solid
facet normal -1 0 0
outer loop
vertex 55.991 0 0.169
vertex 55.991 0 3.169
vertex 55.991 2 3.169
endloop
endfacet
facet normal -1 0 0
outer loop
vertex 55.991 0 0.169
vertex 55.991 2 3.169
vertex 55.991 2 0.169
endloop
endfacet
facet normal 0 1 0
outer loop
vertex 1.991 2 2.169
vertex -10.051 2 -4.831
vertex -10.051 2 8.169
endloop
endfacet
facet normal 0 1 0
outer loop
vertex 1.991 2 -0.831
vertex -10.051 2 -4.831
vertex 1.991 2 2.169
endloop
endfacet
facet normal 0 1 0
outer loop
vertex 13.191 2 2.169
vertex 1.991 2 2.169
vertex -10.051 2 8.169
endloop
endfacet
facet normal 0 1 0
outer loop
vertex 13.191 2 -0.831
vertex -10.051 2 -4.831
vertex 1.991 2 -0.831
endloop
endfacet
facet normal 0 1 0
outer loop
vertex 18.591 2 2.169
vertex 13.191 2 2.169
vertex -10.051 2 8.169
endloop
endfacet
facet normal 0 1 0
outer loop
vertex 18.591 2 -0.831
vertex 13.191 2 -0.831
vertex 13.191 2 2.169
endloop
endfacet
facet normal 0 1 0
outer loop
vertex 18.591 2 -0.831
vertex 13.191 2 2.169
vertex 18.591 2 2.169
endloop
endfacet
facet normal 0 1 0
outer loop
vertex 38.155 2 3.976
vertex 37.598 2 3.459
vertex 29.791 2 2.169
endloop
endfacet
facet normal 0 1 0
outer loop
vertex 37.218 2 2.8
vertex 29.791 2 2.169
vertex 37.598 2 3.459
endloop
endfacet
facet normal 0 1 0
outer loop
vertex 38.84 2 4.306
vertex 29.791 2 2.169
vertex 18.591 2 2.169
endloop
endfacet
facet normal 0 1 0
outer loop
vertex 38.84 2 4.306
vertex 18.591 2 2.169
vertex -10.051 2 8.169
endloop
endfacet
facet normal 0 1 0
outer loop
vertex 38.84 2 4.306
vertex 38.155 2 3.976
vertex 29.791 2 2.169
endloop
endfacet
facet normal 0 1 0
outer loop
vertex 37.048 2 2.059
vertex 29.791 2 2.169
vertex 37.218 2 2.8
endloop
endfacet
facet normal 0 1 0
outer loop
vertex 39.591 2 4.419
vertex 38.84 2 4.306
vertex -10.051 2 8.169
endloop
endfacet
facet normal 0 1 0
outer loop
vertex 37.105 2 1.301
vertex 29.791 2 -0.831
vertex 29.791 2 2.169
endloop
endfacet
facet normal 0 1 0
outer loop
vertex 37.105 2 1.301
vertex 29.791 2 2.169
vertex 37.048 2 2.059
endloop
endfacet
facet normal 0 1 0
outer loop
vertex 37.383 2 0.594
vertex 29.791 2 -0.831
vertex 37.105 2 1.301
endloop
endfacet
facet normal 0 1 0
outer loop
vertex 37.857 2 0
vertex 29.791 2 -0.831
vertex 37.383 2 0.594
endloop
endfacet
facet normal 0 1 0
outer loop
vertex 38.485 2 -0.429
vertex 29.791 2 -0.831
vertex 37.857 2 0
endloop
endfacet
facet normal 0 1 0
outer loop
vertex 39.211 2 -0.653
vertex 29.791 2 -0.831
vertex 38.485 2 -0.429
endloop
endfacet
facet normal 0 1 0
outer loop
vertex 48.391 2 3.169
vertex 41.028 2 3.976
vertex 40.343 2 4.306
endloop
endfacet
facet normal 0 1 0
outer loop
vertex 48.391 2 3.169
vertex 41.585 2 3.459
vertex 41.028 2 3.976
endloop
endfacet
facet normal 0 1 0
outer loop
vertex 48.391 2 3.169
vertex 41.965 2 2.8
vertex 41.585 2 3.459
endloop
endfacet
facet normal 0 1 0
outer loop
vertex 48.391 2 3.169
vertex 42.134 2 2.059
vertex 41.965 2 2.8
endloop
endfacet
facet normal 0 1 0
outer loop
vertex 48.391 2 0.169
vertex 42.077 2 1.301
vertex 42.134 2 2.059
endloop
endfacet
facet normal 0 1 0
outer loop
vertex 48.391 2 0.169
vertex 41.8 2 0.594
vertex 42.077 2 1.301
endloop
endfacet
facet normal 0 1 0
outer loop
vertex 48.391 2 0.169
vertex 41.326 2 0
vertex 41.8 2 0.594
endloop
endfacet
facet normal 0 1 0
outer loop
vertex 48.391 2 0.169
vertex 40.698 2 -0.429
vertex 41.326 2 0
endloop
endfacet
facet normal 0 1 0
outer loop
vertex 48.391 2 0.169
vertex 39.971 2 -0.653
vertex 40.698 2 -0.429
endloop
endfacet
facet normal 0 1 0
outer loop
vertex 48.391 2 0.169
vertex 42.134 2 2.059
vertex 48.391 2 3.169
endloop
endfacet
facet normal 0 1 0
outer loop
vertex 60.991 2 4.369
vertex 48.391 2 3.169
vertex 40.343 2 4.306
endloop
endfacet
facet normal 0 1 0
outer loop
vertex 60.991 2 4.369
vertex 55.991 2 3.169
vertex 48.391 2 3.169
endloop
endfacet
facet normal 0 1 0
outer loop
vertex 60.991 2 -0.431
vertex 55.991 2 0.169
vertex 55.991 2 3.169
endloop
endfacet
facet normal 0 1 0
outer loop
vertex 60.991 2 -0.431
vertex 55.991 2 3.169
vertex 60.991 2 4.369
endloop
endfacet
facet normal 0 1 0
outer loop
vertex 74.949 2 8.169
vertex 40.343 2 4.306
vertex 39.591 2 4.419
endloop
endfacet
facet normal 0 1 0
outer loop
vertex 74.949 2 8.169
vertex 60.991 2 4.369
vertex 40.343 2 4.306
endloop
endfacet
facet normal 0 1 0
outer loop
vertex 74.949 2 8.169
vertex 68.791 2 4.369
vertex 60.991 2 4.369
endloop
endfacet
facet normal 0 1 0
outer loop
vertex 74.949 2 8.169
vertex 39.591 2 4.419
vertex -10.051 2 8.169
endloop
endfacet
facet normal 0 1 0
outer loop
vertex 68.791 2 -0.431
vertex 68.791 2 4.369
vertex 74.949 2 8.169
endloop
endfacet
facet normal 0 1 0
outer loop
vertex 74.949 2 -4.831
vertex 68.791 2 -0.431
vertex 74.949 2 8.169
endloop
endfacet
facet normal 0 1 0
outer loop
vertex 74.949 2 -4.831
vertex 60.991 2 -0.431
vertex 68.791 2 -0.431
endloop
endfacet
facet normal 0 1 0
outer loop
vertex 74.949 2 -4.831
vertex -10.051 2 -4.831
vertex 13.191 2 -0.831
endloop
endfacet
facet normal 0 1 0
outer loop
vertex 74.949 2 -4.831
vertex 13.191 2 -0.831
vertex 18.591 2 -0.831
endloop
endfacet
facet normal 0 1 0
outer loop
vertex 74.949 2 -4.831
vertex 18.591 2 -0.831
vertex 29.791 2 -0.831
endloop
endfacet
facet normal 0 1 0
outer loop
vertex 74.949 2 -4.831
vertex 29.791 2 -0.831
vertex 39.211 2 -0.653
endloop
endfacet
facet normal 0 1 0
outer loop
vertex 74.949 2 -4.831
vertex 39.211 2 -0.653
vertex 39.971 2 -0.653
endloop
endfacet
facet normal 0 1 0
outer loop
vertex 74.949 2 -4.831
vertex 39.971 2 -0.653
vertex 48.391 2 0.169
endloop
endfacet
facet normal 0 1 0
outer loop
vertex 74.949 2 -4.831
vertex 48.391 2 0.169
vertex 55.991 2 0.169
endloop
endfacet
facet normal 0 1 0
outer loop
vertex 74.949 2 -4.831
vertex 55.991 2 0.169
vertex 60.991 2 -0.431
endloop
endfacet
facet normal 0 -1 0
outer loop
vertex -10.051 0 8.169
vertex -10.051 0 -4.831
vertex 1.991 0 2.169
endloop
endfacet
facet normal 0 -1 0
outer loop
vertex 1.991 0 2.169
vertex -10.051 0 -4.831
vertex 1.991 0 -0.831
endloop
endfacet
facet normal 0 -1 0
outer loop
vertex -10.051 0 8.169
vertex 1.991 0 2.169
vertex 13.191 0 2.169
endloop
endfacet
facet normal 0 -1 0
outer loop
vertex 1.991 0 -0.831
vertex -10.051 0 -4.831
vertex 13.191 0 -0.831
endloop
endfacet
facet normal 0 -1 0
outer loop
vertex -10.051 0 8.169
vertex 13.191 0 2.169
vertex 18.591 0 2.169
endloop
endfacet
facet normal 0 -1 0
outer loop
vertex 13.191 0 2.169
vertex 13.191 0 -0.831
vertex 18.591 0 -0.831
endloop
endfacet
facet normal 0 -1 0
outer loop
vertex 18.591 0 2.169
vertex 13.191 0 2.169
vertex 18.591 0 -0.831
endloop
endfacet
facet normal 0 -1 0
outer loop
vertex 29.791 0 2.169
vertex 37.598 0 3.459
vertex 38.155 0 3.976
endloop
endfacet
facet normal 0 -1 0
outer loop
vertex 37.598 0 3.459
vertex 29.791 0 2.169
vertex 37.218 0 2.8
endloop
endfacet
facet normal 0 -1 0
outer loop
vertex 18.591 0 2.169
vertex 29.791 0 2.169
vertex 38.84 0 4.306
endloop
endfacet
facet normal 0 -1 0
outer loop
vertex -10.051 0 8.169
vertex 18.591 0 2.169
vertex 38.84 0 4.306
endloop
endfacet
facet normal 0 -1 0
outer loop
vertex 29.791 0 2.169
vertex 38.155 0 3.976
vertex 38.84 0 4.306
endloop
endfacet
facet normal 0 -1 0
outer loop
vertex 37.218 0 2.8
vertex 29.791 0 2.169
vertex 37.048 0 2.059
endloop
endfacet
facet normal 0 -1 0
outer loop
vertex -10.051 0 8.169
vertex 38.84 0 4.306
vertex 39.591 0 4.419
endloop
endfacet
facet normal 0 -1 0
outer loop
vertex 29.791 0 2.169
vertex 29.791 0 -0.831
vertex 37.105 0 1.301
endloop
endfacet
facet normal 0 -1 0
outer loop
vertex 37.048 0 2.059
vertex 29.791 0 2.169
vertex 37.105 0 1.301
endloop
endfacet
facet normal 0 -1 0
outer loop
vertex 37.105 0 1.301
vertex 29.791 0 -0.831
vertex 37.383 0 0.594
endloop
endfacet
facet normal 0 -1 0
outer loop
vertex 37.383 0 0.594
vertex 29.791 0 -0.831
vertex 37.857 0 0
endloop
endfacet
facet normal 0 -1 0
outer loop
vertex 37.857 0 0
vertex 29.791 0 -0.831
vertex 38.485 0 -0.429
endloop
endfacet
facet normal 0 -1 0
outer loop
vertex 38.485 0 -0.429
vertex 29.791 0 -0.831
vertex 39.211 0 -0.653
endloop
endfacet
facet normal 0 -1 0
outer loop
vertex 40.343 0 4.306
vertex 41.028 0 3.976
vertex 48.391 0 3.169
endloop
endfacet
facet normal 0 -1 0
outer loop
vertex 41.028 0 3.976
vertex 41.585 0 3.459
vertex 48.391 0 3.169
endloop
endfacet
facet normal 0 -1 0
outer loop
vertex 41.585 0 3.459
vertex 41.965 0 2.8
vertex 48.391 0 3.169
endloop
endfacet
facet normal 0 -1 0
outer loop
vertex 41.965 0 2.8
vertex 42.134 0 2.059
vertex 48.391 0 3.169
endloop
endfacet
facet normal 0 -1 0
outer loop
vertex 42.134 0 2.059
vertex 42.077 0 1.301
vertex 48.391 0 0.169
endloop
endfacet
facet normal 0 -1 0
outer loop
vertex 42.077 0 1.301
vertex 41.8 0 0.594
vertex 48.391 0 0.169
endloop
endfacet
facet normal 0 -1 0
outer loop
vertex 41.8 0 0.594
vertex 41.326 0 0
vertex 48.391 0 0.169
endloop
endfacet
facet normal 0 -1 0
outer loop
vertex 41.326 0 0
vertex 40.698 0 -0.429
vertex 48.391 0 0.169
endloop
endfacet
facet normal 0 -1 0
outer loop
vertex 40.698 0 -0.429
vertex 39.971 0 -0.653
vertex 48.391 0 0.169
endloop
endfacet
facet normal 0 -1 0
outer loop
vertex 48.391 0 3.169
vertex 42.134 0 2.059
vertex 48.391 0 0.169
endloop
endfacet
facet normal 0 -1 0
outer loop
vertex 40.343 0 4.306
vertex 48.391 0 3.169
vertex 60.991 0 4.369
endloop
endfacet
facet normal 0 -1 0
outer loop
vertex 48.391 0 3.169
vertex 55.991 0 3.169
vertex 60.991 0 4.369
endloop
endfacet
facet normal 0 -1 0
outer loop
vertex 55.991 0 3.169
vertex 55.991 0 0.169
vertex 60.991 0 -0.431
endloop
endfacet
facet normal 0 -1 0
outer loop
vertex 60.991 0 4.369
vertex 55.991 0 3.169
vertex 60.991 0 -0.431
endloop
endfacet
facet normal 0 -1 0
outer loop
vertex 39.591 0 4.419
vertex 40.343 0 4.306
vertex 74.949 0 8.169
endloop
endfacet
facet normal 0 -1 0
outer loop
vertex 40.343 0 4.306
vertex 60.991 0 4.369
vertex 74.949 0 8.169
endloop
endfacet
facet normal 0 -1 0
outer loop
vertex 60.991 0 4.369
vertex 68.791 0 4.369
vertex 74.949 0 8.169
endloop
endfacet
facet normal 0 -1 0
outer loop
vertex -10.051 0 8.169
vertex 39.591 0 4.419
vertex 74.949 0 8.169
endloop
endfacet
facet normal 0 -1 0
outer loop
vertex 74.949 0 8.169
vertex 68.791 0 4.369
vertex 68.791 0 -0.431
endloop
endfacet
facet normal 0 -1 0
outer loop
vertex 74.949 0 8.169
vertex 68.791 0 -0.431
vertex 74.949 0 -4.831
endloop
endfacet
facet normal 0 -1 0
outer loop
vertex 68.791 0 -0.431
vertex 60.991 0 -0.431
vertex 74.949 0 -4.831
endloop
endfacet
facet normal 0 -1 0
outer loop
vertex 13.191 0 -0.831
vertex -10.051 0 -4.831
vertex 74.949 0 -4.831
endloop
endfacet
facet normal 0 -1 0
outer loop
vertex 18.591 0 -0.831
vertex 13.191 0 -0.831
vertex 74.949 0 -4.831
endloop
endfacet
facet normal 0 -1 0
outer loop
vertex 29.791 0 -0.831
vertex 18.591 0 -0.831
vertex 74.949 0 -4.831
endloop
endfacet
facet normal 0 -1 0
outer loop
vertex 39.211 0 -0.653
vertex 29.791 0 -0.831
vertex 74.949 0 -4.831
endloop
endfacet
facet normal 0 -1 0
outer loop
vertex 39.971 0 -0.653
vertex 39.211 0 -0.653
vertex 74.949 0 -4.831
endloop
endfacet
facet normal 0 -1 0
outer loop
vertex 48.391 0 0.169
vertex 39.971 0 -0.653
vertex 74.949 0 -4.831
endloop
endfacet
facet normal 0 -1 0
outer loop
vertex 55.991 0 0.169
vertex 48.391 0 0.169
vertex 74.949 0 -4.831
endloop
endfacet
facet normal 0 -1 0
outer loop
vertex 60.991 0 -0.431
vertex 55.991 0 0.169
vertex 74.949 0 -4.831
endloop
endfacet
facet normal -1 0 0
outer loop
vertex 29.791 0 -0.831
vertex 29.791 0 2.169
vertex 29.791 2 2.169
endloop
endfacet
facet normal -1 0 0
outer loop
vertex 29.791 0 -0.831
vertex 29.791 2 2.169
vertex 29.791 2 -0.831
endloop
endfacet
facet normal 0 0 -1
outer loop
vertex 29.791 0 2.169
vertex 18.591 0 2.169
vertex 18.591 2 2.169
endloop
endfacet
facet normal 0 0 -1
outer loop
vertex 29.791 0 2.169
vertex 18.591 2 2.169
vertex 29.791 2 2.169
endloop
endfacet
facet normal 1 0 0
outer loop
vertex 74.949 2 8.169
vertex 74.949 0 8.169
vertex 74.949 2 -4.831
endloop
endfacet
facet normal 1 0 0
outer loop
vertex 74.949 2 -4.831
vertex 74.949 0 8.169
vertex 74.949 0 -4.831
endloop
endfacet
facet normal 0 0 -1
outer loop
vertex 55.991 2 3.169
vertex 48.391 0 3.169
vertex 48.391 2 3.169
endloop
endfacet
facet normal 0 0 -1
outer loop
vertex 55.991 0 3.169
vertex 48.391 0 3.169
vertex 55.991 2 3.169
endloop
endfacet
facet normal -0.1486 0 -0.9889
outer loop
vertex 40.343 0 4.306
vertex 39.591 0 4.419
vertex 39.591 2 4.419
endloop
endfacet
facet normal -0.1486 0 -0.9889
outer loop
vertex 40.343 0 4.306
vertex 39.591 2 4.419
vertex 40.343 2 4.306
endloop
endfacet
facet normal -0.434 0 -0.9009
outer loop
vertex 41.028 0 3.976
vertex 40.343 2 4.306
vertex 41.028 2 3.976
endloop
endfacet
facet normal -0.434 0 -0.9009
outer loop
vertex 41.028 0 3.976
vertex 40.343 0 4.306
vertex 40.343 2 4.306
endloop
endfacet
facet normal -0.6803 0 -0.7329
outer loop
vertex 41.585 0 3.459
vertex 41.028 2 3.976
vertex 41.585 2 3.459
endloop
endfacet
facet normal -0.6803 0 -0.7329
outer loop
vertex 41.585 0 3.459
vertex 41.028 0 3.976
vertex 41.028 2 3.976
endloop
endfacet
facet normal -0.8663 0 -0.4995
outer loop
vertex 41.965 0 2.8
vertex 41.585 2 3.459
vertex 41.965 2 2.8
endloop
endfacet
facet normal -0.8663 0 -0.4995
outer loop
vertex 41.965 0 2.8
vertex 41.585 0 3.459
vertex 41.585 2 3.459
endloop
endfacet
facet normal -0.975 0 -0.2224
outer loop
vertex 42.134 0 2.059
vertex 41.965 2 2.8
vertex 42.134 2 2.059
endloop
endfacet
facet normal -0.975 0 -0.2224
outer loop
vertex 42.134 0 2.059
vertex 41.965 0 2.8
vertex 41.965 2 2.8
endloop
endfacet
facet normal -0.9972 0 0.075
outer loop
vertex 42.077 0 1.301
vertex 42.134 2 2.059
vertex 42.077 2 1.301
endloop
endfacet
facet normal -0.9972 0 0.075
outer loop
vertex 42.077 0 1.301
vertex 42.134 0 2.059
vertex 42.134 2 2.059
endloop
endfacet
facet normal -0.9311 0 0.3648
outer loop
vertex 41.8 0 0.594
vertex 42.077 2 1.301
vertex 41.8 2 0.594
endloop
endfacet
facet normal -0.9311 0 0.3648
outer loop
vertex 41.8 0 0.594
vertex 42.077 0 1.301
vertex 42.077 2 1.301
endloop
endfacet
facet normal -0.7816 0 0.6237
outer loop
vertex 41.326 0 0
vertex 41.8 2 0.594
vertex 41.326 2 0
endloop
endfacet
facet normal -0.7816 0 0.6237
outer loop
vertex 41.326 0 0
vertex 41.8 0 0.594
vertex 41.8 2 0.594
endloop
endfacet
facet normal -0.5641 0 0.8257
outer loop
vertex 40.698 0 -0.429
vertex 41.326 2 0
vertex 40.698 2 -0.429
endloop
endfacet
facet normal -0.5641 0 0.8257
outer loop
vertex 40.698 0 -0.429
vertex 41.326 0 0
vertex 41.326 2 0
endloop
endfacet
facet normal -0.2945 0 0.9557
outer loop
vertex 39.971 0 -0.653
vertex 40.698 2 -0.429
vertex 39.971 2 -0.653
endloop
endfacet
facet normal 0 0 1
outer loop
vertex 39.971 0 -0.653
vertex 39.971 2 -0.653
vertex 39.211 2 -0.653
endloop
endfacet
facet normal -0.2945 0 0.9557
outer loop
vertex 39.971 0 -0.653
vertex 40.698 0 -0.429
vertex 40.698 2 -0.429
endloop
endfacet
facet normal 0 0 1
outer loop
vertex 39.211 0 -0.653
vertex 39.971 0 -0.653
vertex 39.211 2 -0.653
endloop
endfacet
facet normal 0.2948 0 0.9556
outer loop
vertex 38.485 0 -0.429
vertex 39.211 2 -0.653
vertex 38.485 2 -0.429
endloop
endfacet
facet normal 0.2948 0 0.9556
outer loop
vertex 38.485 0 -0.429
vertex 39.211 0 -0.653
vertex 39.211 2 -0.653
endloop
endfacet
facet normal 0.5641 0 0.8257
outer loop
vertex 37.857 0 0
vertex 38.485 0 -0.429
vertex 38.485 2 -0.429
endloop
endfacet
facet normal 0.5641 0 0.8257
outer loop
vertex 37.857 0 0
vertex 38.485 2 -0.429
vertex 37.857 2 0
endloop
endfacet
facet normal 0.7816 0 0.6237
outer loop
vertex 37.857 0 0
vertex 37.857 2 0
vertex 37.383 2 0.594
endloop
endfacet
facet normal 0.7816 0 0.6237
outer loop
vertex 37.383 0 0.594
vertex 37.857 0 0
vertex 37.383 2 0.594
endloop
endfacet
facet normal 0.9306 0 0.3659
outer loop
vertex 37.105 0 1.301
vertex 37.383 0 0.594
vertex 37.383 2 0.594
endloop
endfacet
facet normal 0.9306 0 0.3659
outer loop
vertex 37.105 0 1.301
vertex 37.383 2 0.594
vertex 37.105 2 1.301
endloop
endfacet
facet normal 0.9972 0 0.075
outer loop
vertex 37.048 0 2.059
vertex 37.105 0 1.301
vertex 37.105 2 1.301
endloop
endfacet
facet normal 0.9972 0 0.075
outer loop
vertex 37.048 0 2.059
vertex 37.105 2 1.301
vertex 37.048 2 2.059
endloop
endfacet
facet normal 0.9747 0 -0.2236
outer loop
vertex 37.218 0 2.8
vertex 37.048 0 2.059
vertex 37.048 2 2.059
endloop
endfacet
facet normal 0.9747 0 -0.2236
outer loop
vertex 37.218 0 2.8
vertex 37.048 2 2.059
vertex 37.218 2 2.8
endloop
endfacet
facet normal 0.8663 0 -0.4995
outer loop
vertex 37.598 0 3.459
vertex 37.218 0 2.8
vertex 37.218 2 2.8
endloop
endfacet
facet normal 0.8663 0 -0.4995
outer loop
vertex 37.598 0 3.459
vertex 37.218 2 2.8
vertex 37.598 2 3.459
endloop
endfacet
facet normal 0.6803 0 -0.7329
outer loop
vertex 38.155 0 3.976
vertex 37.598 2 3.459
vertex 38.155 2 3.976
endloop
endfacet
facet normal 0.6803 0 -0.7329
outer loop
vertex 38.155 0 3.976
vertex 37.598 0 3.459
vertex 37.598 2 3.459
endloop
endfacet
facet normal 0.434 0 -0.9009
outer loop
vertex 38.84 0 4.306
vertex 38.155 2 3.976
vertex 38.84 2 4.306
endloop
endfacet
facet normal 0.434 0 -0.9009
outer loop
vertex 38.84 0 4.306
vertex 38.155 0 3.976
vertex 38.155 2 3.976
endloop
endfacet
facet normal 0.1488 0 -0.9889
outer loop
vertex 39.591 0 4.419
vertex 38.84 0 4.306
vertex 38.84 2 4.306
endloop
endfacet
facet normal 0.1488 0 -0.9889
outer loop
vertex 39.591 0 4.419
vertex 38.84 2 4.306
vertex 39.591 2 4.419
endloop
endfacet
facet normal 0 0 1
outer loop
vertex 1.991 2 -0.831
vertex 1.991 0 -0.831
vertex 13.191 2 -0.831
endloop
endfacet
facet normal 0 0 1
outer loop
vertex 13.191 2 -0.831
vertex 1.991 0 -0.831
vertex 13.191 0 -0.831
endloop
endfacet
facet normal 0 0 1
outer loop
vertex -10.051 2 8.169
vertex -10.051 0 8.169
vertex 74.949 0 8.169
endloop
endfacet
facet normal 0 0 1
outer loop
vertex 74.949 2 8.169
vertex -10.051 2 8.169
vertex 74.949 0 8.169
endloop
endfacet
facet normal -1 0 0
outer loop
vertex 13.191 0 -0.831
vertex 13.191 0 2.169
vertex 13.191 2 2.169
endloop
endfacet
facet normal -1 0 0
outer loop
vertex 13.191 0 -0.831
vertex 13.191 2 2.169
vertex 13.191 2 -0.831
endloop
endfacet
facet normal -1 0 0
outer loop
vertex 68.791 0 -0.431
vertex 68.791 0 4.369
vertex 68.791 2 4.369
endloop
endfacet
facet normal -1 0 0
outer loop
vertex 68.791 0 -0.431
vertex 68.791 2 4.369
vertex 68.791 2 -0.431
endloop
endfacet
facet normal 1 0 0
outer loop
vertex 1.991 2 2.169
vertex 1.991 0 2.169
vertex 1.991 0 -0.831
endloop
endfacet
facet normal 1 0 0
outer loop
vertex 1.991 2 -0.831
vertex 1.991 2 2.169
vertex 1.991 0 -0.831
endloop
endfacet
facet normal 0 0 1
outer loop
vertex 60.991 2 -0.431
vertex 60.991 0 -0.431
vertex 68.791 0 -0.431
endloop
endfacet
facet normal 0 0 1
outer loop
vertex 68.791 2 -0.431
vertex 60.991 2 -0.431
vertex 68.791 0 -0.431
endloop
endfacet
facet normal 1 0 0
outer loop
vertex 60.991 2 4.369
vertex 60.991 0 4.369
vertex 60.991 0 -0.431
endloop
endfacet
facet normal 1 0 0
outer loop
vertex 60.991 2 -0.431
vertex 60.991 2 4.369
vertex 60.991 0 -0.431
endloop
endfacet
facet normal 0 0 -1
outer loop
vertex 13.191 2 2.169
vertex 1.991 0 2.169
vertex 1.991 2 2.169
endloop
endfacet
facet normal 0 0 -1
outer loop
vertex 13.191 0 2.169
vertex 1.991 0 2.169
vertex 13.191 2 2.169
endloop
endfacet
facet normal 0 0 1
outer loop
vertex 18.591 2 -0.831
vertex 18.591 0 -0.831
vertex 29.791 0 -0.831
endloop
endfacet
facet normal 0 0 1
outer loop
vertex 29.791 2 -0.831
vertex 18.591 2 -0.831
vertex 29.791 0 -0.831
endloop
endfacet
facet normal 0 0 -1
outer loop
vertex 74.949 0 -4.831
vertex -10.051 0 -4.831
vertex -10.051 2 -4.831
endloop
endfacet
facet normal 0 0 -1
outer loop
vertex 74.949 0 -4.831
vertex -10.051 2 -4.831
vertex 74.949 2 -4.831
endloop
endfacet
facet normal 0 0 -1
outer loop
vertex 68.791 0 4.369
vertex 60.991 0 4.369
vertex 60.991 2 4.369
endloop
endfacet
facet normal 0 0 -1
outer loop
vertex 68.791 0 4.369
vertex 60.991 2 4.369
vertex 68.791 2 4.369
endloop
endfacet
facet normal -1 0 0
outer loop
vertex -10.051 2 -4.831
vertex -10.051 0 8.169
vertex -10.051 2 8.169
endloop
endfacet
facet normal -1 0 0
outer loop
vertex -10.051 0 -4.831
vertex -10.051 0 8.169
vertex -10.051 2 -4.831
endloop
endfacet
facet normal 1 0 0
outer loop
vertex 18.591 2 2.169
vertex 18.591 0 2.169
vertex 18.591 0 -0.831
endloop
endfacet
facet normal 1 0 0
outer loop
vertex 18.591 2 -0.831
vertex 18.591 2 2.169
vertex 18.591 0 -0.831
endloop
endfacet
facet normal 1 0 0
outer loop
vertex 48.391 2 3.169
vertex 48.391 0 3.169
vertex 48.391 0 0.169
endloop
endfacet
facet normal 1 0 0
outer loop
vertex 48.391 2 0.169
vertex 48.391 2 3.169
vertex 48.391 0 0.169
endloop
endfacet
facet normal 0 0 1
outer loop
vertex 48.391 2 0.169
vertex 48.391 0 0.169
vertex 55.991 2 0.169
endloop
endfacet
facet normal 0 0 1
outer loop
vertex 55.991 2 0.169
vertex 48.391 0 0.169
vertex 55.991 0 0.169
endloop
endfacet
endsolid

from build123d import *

# Parameters (mm, degrees)
SKETCH_1_W      = 85
SKETCH_1_H      = 13
SKETCH_1_R      = 2.55
SKETCH_1_W_2    = 7.8
SKETCH_1_H_2    = 4.8
SKETCH_1_W_3    = 7.6
SKETCH_1_H_3    = 3
SKETCH_1_W_4    = 11.2
EXTRUDE_2_DEPTH = 2


with BuildPart() as part:
    # 草图1 → 凸台-拉伸2 (new body)
    with BuildSketch(Plane(origin=(0, 0, 0), x_dir=(1, 0, 0), z_dir=(0, 1, 0))):
        with Locations((32.448630137, -1.668848032)):
            Rectangle(SKETCH_1_W, SKETCH_1_H)
        with Locations(Location((39.591348171, -1.868848032, 0), (0, 0, 270))):
            Circle(SKETCH_1_R, mode=Mode.SUBTRACT)
        with Locations((64.891348171, -1.968848032)):
            Rectangle(SKETCH_1_W_2, SKETCH_1_H_2, mode=Mode.SUBTRACT)
        with Locations((52.191348171, -1.668848032)):
            Rectangle(SKETCH_1_W_3, SKETCH_1_H_3, mode=Mode.SUBTRACT)
        with Locations((24.191348171, -0.668848032)):
            Rectangle(SKETCH_1_W_4, SKETCH_1_H_3, mode=Mode.SUBTRACT)
        with Locations((7.591348171, -0.668848032)):
            Rectangle(SKETCH_1_W_4, SKETCH_1_H_3, mode=Mode.SUBTRACT)
    extrude(amount=EXTRUDE_2_DEPTH)


solid = part.part
